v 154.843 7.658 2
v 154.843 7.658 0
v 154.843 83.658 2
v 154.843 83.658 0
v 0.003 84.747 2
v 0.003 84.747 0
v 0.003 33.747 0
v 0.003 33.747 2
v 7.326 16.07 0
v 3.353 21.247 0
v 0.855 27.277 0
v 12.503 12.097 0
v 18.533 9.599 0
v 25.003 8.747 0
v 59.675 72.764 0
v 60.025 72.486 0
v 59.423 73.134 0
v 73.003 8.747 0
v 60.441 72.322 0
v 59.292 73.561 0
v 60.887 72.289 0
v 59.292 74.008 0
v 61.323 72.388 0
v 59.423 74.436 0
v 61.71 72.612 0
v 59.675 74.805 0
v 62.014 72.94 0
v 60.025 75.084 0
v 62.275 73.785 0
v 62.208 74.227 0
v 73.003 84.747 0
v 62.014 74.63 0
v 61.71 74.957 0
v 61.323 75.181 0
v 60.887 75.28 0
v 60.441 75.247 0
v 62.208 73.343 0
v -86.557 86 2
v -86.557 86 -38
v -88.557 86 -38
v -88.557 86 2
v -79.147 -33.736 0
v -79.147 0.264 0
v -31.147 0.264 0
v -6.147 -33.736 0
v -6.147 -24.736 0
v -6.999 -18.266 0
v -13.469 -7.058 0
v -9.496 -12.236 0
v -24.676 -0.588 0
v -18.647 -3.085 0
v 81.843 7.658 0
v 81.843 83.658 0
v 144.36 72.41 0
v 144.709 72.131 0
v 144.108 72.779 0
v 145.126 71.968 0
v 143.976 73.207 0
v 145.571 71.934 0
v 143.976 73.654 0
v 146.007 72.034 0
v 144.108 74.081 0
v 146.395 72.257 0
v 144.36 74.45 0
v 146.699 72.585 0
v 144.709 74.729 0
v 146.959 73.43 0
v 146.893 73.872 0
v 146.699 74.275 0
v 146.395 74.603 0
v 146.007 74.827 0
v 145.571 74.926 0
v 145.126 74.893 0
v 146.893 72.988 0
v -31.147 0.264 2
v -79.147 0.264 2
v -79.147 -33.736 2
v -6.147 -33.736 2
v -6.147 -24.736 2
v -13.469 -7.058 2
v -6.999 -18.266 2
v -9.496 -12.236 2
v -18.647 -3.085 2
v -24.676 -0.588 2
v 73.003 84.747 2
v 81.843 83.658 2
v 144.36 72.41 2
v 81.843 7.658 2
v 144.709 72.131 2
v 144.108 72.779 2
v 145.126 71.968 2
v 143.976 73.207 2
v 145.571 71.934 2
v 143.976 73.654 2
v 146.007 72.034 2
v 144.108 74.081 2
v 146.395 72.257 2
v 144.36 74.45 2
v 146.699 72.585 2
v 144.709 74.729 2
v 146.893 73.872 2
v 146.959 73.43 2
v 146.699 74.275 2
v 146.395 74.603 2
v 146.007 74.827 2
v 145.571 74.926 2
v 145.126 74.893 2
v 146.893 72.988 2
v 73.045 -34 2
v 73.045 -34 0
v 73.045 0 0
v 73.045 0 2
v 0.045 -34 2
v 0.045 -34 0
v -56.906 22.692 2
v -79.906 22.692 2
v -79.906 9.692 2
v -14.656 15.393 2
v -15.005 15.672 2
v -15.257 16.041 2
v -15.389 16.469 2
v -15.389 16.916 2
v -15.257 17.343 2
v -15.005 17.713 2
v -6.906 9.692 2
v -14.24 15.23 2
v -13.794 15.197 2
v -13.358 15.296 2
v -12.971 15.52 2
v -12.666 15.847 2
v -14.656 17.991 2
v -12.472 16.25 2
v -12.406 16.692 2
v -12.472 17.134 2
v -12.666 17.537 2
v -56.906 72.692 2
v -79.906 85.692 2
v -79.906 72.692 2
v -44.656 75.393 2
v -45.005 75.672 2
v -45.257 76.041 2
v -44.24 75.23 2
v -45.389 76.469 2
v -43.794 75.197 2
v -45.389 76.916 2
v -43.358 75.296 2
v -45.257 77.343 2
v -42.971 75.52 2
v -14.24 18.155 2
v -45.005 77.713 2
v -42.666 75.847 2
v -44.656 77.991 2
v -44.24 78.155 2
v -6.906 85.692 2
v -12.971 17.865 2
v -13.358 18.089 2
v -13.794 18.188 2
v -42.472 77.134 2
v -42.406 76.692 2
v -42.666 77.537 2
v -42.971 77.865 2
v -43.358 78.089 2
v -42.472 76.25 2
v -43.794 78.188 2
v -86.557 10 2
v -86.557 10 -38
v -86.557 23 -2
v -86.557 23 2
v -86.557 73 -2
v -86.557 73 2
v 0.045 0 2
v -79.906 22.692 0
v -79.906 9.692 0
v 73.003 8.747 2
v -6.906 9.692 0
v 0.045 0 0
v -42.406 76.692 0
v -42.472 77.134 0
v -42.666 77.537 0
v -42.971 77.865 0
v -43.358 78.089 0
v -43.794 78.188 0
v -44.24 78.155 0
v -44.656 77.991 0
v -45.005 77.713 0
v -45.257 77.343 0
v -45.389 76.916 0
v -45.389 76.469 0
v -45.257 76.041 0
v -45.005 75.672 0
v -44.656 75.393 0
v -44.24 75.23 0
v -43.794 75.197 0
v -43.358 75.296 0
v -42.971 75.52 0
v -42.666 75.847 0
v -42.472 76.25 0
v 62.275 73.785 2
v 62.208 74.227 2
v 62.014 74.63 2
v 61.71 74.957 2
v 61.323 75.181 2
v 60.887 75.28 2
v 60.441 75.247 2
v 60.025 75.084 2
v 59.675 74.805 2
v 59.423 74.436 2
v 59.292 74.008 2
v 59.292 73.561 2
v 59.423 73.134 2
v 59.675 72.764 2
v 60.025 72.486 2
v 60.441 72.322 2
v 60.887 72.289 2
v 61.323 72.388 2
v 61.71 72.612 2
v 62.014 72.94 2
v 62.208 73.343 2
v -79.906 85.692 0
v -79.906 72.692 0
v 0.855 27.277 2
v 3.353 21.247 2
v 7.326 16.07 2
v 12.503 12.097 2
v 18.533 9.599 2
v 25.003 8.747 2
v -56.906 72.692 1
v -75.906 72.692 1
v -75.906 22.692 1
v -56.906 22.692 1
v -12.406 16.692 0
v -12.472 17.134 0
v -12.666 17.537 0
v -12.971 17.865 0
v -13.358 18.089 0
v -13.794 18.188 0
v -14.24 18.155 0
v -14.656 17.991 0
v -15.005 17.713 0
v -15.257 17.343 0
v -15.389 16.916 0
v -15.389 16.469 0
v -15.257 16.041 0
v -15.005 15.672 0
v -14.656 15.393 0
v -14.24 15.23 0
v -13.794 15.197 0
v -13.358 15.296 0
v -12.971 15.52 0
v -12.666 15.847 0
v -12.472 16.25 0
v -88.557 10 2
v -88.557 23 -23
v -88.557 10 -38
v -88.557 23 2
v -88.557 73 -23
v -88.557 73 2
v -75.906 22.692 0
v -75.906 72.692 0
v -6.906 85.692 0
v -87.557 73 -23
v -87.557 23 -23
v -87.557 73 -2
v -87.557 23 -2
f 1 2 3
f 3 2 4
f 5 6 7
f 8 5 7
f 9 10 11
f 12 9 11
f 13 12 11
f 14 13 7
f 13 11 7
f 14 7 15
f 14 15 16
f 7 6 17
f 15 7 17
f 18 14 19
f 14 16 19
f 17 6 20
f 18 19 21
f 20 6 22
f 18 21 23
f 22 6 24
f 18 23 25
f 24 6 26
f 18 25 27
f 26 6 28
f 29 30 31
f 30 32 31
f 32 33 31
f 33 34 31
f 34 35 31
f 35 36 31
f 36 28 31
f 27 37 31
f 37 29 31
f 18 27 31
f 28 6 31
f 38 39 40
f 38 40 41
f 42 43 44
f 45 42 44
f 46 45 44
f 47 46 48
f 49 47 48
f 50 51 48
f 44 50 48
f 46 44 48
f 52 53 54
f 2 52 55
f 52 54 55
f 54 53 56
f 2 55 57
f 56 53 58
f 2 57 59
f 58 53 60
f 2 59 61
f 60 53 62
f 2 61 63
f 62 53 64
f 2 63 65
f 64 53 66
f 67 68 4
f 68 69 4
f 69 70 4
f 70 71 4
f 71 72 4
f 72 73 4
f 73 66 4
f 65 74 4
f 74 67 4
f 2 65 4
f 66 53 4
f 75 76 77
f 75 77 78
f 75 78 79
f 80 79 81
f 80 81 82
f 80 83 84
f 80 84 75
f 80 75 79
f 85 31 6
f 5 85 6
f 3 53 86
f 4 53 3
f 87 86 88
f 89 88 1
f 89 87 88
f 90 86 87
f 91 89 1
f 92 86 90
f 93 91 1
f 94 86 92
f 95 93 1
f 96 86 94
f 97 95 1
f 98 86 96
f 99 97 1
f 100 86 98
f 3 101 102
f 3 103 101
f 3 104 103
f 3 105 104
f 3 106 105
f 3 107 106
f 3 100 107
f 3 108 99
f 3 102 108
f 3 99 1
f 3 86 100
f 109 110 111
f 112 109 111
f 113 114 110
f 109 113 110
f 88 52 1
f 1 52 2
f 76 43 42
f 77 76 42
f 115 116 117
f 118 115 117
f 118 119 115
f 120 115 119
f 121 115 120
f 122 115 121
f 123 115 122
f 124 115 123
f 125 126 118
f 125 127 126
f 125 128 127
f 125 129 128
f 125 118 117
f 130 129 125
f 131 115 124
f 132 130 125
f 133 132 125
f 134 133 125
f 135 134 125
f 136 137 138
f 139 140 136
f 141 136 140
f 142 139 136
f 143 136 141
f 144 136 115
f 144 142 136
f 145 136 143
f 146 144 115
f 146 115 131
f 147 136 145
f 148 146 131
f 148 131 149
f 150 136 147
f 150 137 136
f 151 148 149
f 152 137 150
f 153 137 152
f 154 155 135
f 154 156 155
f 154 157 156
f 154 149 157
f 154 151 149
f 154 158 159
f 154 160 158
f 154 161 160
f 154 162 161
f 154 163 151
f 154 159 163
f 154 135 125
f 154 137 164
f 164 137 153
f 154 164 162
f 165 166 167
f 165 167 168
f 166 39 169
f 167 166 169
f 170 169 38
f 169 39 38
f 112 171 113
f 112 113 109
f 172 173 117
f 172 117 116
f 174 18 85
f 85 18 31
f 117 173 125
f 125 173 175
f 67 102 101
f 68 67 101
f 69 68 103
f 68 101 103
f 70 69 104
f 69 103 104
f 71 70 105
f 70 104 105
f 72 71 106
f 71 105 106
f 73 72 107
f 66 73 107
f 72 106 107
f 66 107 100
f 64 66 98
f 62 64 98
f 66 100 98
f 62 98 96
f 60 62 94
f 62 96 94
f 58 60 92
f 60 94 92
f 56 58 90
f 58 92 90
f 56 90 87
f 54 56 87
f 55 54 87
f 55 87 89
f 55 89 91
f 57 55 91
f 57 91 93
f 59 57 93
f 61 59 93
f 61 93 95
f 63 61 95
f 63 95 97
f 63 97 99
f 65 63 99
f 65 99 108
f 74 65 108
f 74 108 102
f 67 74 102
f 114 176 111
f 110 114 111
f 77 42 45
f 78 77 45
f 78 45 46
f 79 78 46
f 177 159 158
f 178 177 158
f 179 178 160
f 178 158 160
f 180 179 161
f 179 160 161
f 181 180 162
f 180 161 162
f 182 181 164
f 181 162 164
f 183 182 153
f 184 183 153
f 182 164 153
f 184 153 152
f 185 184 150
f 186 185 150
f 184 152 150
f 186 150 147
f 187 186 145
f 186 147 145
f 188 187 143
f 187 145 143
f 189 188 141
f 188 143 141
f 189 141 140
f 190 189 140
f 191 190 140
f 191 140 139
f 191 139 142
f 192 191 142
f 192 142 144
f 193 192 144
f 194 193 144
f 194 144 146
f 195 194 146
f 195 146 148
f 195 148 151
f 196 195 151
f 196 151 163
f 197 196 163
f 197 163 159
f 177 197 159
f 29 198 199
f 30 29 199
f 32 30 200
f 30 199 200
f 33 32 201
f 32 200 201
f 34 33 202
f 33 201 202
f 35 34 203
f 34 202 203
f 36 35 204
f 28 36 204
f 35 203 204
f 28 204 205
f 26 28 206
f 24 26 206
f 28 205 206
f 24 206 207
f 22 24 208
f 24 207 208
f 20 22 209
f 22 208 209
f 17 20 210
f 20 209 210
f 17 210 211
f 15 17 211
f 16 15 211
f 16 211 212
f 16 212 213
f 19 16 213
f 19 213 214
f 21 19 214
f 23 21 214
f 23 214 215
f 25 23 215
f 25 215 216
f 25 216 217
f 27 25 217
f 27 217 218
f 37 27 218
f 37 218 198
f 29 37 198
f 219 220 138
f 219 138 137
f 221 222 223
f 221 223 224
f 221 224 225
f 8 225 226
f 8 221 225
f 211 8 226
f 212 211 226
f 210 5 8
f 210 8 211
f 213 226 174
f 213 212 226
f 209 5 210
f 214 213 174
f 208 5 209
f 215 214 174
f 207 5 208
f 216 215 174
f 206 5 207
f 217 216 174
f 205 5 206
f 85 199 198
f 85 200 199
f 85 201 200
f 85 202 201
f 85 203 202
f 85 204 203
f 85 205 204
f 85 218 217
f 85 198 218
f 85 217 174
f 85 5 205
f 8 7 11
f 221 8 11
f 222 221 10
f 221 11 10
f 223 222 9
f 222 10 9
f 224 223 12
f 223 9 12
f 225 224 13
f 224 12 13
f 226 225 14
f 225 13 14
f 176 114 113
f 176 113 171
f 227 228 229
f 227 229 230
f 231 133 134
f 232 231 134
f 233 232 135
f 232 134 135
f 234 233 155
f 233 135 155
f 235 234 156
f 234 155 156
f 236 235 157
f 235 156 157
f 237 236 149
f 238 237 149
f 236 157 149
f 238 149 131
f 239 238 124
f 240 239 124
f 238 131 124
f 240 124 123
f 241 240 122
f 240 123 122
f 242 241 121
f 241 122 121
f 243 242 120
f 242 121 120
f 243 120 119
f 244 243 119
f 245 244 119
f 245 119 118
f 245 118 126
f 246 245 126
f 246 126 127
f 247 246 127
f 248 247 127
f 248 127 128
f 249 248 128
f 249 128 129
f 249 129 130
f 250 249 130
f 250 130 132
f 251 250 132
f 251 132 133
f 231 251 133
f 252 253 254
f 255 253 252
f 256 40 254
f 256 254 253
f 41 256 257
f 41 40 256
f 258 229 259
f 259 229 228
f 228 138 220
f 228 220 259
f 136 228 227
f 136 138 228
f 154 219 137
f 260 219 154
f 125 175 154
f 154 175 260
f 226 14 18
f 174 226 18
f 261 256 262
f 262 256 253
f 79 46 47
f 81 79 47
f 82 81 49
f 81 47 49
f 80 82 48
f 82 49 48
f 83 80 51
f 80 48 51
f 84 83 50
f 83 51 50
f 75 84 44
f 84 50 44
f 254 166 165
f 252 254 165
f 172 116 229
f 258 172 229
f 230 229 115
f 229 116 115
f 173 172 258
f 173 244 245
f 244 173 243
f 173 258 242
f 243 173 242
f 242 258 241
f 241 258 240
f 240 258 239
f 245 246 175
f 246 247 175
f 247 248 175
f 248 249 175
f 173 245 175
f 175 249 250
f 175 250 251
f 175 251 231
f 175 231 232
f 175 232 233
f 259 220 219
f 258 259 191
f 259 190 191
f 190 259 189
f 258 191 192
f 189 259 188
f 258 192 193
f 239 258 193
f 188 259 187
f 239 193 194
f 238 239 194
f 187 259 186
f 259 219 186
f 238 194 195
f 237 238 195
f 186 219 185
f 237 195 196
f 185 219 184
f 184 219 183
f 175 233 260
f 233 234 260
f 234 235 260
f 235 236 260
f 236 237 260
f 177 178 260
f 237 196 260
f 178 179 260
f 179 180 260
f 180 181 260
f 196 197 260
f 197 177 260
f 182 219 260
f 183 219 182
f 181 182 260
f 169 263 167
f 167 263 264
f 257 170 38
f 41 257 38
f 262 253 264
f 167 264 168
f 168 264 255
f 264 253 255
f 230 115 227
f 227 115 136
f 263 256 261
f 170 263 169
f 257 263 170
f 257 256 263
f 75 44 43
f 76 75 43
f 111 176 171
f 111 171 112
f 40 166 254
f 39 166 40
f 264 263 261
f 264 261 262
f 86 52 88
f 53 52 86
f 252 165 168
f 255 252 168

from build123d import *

# Parameters (mm, degrees)
F0_W      = 73
F0_H      = 76
F1_DEPTH  = 2
F3_DEPTH  = 2
F5_DEPTH  = 2
F6_W      = 73
F6_H      = 34
F7_DEPTH  = 2
F8_W      = 73
F8_H      = 76
F9_DEPTH  = 2
F10_W     = 40
F10_H     = 76
F11_DEPTH = 2
F13_R     = 1.5
F14_DEPTH = 3
F16_ANGLE = 90
F17_W     = 23
F17_H     = 50
F18_DEPTH = 1
F19_W     = 4
F19_H     = 50
F20_DEPTH = 2
F21_W     = 50
F21_H     = 25
F22_DEPTH = 1
F23_W     = 50
F23_H     = 4
F24_DEPTH = 1.5


with BuildPart() as f1:
    # F0 (on Top) → F1 (new body)
    with BuildSketch(Plane.XY):
        with Locations((-43.4057699293, 47.692308493)):
            Rectangle(F0_W, F0_H)
    extrude(amount=F1_DEPTH)


with BuildPart() as f3:
    # F2 (on Top) → F3 (new body)
    with BuildSketch(Plane.XY):
        with BuildLine():
            Line((73.003411293, 84.7474151826), (0.003411293, 84.7474151826))
            Line((0.003411293, 84.7474151826), (0.003411293, 33.7474151826))
            ThreePointArc((0.003411293, 33.7474151826), (7.3257417634, 16.069745653), (25.003411293, 8.7474151826))
            Line((25.003411293, 8.7474151826), (73.003411293, 8.7474151826))
            Line((73.003411293, 8.7474151826), (73.003411293, 84.7474151826))
        make_face()
    extrude(amount=F3_DEPTH)


with BuildPart() as f5:
    # F4 (on Top) → F5 (new body)
    with BuildSketch(Plane.XY):
        with BuildLine():
            Line((-31.1469516055, 0.2639060989), (-79.1469516055, 0.2639060989))
            Line((-79.1469516055, 0.2639060989), (-79.1469516055, -33.7360939011))
            Line((-79.1469516055, -33.7360939011), (-6.1469516055, -33.7360939011))
            Line((-6.1469516055, -33.7360939011), (-6.1469516055, -24.7360939011))
            ThreePointArc((-6.1469516055, -24.7360939011), (-13.4692820759, -7.0584243714), (-31.1469516055, 0.2639060989))
        make_face()
    extrude(amount=F5_DEPTH)


with BuildPart() as f7:
    # F6 (on Top) → F7 (new body)
    with BuildSketch(Plane.XY):
        with Locations((36.5447524944, -17)):
            Rectangle(F6_W, F6_H)
    extrude(amount=F7_DEPTH)


with BuildPart() as f9:
    # F8 (on Top) → F9 (new body)
    with BuildSketch(Plane.XY):
        with Locations((118.3430621624, 45.6581593603)):
            Rectangle(F8_W, F8_H)
    extrude(amount=F9_DEPTH)


with BuildPart() as f11:
    # F10 (on Top) → F11 (new body)
    with BuildSketch(Plane.XY):
        with Locations((101.4428705918, -38)):
            Rectangle(F10_W, F10_H)
    extrude(amount=F11_DEPTH)


with BuildPart() as f11b:
    # F10 (on Top) → F11, piece 2 (new body)
    with BuildSketch(Plane.XY):
        with Locations((148.2472270727, -38.0005940096)):
            Rectangle(F10_W, F10_H)
    extrude(amount=F11_DEPTH)


with BuildPart() as f14_tool:
    # F13 (on face) → F14 (new body)
    with BuildSketch(Plane.XY.offset(2)):
        with Locations((60.7747882605, 73.784686625)):
            Circle(F13_R)
        with Locations((145.4593382223, 73.4302078024)):
            Circle(F13_R)
        with Locations((-13.9057699293, 16.692308493)):
            Circle(F13_R)
        with Locations((-43.9057699293, 76.692308493)):
            Circle(F13_R)
    extrude(amount=-F14_DEPTH)


with BuildPart() as f1_1:
    add(f1.part)

    # F14: cut by f14_tool
    add(f14_tool.part, mode=Mode.SUBTRACT)

    # F17 (on face) → F18 (cut)
    with BuildSketch(Plane.XY.offset(2)):
        with Locations((-68.4057699293, 47.692308493)):
            Rectangle(F17_W, F17_H)
    extrude(amount=-F18_DEPTH, mode=Mode.SUBTRACT)

    # F19 (on face) → F20 (cut)
    with BuildSketch(Plane.XY.offset(1)):
        with Locations((-77.9057699293, 47.692308493)):
            Rectangle(F19_W, F19_H)
    extrude(amount=-F20_DEPTH, mode=Mode.SUBTRACT)


with BuildPart() as f3_1:
    add(f3.part)

    # F14: cut by f14_tool
    add(f14_tool.part, mode=Mode.SUBTRACT)


with BuildPart() as f9_1:
    add(f9.part)

    # F14: cut by f14_tool
    add(f14_tool.part, mode=Mode.SUBTRACT)


with BuildPart() as f11_1:
    # F15: moved
    add(f11.part.moved(Location((-210, 86, 0))))


with BuildPart() as f11_2:
    # F16: moved
    add(f11_1.part.rotate(Axis((-88.5571294082, 48, 2), (0, -1, 0)), F16_ANGLE))

    # F21 (on face) → F22 (cut)
    with BuildSketch(Plane(origin=(-88.5571294082, 0, 0), x_dir=(0, -1, 0), z_dir=(-1, 0, 0))):
        with Locations((-48, -10.5)):
            Rectangle(F21_W, F21_H)
    extrude(amount=-F22_DEPTH, mode=Mode.SUBTRACT)

    # F23 (on face) → F24 (cut)
    with BuildSketch(Plane(origin=(-87.5571294082, 0, 0), x_dir=(0, -1, 0), z_dir=(-1, 0, 0))):
        with Locations((-48, 0)):
            Rectangle(F23_W, F23_H)
    extrude(amount=-F24_DEPTH, mode=Mode.SUBTRACT)


solid = Compound([f5.part, f7.part, f1_1.part, f3_1.part, f9_1.part, f11_2.part])
